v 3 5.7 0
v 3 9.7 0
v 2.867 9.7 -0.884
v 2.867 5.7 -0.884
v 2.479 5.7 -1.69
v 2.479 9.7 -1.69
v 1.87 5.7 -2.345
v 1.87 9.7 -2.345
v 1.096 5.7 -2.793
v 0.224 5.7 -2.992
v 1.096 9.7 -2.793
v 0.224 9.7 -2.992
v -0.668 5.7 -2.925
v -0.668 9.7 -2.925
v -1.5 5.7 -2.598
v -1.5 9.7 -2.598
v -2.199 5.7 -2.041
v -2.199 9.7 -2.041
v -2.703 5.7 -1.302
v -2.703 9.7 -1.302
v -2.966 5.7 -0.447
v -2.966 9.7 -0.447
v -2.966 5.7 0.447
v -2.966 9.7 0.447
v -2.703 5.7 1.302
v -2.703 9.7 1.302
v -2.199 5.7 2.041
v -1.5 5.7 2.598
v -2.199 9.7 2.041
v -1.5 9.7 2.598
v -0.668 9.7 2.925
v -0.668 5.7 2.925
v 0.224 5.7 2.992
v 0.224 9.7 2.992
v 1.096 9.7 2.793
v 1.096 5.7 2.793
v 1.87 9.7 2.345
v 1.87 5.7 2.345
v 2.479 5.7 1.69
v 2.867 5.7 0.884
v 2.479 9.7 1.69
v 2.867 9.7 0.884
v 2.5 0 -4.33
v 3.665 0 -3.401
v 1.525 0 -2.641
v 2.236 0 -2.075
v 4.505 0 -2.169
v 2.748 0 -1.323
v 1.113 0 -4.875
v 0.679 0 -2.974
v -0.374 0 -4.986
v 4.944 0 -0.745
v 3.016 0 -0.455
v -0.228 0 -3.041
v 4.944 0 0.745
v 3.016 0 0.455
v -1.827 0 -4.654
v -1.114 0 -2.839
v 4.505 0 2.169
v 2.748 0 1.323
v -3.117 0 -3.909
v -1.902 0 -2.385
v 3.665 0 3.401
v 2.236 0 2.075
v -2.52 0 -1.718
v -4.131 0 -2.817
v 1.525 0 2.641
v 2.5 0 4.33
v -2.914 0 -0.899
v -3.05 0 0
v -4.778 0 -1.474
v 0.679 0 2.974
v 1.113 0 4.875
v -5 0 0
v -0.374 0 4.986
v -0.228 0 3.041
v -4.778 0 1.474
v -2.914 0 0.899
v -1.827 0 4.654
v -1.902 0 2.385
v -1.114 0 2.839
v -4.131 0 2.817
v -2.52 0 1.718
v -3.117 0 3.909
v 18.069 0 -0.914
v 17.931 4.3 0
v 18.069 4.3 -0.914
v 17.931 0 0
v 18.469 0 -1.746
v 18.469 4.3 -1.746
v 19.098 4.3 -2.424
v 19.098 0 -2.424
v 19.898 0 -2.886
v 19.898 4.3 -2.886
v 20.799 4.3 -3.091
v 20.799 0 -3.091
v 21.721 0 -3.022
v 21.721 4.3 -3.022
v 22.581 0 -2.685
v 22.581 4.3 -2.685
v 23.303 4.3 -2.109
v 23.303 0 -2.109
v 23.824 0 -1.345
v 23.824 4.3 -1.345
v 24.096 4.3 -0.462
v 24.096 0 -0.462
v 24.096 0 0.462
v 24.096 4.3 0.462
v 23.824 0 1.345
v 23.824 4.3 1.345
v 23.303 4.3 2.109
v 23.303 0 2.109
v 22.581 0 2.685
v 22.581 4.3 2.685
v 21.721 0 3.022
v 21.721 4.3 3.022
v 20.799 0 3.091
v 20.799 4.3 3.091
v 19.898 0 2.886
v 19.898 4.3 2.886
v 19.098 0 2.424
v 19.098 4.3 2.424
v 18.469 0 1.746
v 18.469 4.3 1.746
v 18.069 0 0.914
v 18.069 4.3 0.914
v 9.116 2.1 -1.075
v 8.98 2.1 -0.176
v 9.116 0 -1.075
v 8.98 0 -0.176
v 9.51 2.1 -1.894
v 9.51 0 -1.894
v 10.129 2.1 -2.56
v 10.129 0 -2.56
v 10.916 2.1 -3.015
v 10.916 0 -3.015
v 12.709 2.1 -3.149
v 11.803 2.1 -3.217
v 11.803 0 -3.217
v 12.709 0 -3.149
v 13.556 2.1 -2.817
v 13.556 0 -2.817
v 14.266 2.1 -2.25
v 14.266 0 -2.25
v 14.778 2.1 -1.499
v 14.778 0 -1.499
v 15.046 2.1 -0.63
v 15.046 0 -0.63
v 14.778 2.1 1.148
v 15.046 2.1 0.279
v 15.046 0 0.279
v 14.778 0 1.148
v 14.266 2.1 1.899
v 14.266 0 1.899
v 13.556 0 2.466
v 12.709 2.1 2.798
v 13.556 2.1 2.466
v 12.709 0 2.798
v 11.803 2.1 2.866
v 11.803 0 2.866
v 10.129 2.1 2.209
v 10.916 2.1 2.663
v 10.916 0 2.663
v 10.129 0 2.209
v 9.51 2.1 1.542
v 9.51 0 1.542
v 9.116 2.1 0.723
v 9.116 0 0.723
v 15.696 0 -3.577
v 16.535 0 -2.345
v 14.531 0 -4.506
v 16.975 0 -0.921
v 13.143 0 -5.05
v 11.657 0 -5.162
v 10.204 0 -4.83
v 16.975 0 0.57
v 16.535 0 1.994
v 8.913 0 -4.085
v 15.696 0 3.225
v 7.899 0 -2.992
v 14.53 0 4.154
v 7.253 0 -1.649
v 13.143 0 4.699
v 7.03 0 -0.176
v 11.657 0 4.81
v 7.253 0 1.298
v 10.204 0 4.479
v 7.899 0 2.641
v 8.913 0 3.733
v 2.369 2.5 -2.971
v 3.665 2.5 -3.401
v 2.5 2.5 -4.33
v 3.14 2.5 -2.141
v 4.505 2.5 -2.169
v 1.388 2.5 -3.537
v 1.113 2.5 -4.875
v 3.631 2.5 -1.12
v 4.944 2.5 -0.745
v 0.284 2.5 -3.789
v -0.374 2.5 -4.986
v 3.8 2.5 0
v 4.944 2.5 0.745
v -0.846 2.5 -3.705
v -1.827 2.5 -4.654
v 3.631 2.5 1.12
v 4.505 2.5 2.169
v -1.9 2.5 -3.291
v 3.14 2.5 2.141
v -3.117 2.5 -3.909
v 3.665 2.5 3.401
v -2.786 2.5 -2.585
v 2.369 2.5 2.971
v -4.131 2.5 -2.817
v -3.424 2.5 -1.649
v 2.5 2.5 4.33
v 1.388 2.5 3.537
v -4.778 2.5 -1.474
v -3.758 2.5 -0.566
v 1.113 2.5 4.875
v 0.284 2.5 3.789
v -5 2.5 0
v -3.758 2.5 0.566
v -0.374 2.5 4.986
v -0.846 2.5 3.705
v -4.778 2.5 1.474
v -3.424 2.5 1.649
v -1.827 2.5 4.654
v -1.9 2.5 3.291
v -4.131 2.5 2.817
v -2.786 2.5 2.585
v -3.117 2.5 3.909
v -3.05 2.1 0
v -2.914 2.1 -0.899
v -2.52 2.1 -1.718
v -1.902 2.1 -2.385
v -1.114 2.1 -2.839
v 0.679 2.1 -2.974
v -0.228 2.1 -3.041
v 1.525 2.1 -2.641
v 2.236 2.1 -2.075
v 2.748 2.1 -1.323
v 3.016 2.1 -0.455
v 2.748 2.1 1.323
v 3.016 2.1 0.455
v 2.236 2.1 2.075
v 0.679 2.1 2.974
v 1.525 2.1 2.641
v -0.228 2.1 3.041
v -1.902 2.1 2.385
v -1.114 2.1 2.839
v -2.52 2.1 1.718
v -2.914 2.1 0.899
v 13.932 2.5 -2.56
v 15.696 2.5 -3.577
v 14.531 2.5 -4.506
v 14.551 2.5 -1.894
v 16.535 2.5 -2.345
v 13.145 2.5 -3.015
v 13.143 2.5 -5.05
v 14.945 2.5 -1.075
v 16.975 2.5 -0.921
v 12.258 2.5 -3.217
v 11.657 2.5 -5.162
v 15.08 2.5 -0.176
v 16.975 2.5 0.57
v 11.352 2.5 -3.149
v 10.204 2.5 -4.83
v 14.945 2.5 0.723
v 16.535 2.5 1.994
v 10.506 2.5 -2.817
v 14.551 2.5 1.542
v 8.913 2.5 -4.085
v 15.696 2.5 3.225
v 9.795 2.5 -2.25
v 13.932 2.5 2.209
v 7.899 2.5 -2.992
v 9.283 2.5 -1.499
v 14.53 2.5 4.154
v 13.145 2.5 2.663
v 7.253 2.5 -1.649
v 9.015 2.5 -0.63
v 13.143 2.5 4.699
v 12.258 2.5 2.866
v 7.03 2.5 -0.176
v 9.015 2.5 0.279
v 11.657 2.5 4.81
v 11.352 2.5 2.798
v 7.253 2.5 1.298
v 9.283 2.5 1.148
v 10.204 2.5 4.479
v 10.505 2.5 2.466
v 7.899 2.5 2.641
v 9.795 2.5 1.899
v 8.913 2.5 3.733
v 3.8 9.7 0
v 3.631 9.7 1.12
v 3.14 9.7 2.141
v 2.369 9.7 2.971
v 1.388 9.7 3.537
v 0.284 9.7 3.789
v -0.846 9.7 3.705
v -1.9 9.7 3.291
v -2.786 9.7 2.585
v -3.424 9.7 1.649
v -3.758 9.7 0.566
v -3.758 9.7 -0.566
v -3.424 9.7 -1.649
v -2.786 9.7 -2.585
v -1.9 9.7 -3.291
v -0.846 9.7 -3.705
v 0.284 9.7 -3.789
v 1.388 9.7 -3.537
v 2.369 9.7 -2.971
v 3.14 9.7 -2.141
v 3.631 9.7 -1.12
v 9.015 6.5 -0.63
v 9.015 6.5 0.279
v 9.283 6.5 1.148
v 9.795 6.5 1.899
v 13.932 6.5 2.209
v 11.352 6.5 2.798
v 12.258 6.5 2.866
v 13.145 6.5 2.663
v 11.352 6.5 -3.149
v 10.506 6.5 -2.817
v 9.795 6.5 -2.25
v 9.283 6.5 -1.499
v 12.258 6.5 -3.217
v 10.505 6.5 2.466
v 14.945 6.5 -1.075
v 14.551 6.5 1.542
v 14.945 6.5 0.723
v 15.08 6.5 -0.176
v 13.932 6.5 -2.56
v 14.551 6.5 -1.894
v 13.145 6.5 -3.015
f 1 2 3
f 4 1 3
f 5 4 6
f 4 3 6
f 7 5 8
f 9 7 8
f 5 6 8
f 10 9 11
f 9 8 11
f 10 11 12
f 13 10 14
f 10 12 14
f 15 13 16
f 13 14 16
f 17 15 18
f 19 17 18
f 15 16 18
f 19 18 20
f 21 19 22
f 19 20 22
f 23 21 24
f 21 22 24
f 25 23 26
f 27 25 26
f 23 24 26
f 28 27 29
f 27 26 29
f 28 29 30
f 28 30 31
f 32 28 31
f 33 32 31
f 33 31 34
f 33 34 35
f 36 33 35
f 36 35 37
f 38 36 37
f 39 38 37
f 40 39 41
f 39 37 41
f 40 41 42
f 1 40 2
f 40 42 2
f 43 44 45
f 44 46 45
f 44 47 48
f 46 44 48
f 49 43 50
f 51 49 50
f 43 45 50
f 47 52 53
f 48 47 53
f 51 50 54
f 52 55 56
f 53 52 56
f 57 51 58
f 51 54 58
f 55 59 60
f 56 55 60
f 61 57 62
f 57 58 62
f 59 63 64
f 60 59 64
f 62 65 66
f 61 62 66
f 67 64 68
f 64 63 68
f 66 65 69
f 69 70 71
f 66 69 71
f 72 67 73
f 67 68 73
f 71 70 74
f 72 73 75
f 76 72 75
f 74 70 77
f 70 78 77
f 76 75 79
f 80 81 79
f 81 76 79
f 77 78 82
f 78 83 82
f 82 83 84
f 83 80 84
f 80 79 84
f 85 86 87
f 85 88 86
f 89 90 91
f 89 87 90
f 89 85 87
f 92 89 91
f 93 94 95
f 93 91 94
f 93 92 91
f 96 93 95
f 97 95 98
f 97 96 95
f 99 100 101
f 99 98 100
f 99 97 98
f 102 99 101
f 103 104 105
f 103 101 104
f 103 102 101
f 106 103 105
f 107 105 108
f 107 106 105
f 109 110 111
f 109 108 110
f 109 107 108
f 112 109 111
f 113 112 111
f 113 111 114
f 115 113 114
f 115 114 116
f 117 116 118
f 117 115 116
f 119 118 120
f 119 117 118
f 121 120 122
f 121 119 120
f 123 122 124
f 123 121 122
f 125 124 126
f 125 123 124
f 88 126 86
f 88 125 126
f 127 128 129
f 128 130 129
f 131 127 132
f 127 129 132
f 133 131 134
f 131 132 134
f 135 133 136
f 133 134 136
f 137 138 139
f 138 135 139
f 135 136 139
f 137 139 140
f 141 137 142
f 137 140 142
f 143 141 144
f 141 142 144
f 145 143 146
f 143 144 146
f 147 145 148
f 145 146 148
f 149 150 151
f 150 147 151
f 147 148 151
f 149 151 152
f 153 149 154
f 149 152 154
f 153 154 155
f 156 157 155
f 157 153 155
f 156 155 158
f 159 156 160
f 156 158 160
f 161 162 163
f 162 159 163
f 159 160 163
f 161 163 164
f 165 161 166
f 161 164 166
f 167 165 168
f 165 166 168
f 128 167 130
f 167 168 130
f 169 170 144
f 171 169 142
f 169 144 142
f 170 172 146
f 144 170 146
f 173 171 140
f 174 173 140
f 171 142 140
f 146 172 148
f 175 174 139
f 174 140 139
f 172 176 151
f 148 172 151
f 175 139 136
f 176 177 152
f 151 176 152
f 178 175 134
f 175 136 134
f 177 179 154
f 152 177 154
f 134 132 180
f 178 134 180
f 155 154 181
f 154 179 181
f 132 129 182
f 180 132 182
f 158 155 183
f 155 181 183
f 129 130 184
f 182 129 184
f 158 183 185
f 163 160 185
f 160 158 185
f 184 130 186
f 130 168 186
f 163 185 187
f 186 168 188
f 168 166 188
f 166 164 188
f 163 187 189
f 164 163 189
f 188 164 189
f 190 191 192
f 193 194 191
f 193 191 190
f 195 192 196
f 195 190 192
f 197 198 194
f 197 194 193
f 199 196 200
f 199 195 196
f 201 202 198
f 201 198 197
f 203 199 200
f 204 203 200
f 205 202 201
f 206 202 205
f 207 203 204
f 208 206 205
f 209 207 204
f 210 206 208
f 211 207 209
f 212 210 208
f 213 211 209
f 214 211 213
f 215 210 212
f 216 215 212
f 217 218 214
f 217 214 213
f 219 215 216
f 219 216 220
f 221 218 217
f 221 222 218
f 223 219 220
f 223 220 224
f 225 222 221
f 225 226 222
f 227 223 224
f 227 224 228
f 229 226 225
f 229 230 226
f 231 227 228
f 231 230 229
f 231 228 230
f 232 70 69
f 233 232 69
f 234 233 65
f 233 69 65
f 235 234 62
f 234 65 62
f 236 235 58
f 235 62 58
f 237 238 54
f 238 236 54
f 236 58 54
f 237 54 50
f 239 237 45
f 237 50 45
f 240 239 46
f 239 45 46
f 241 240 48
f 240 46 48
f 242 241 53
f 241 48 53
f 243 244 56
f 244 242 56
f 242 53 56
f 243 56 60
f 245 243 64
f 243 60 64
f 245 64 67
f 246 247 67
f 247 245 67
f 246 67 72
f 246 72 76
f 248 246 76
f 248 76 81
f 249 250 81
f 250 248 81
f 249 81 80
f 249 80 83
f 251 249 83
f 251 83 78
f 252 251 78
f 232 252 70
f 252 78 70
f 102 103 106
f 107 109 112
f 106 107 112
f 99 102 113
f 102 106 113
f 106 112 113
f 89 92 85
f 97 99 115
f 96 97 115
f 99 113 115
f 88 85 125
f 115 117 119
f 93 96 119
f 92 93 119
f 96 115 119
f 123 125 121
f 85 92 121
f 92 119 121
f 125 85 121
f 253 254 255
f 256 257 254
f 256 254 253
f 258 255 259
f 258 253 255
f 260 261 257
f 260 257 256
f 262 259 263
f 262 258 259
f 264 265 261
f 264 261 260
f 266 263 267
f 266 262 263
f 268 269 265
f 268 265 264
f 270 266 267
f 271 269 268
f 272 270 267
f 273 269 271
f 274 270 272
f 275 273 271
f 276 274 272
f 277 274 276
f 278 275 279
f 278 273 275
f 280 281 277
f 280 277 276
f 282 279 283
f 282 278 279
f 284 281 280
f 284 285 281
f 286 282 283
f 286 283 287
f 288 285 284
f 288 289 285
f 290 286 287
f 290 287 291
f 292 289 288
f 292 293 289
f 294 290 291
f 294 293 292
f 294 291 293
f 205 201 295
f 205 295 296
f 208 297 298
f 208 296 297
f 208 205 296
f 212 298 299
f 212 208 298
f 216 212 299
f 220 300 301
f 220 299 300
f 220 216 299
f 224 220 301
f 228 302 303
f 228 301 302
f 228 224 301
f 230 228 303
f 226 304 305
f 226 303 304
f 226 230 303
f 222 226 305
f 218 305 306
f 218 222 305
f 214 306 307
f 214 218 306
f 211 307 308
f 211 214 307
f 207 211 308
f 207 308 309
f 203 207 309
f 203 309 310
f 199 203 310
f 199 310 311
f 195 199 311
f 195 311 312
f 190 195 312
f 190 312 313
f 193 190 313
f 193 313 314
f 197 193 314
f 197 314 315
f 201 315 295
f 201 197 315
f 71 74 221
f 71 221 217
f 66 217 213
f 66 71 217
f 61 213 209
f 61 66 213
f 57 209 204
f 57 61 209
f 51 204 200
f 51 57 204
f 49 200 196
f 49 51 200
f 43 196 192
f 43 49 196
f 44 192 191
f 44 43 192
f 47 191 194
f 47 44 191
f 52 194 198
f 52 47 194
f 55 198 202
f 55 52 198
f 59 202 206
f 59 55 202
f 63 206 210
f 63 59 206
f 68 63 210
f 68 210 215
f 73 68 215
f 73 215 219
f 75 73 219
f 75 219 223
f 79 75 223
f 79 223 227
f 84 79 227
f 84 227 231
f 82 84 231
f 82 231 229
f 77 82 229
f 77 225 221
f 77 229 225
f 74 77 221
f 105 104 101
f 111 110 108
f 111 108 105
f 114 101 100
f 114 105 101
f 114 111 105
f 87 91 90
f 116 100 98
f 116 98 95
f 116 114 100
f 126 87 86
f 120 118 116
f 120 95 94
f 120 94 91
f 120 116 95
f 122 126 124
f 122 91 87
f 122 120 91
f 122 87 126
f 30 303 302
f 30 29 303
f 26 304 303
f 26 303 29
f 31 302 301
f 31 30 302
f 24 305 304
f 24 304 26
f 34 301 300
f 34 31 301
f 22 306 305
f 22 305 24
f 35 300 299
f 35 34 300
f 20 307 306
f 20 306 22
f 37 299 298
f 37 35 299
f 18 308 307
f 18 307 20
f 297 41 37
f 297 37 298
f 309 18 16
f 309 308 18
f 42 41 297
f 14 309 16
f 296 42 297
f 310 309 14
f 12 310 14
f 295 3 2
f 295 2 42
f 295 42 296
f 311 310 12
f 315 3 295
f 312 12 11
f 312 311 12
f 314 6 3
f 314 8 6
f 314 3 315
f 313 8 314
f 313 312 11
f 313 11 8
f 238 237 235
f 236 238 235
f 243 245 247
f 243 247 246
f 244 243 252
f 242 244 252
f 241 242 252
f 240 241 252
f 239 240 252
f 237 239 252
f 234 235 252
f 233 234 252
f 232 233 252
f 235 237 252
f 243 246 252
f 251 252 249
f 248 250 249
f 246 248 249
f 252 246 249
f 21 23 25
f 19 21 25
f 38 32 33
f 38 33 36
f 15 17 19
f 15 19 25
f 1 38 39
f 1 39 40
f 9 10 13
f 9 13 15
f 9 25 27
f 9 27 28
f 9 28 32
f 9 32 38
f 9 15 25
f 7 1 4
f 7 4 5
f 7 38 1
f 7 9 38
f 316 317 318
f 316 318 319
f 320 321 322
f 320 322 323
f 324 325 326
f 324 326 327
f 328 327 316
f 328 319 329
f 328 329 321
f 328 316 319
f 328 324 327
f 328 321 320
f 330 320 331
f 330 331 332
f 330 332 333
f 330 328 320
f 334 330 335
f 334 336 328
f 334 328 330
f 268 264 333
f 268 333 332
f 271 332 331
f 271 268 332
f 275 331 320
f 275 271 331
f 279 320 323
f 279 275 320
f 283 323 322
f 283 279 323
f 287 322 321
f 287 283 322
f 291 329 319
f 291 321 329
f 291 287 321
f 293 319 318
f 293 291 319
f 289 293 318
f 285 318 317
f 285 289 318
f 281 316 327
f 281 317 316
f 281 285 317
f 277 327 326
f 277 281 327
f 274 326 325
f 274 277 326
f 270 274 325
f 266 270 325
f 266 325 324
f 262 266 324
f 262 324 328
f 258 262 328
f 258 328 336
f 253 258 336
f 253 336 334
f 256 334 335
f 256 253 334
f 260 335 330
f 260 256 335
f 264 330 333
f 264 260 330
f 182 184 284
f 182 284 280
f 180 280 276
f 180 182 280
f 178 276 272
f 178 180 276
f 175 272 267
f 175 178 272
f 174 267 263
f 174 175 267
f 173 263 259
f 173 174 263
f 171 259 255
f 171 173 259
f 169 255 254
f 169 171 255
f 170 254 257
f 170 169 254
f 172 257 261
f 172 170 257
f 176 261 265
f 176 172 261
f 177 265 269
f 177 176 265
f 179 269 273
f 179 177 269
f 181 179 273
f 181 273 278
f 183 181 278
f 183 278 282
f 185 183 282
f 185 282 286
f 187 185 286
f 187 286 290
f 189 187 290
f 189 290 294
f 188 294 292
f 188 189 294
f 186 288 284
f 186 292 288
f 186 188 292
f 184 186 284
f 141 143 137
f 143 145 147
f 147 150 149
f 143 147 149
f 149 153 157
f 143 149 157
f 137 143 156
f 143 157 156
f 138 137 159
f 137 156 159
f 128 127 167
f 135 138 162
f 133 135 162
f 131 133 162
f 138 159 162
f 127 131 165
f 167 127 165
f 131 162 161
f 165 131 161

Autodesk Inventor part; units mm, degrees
ref_plane "YZ Plane" through (0, 0, 0) normal (1, 0, 0) x (0, 1, 0)
ref_plane "XZ Plane" through (0, 0, 0) normal (0, 1, 0) x (-1, 0, 0)
ref_plane "XY Plane" through (0, 0, 0) normal (0, 0, 1) x (1, 0, 0)
sketch "Sketch4" plane through (0, 0, 0) normal (0, 1, 0) x (-1, 0, 0)
  circle A0 centre (0, 0) radius 3.05
  circle A1 centre (0, 0) radius 5
  circle A2 centre (-12.0305, -0.1757) radius 3.05
  circle A3 centre (-12.0305, -0.1757) radius 5
  circle A4 centre (-21.0308, 0) radius 3.1
  dimension "d13" = 6.1
  dimension "d14" = 10
  dimension "d25" = 6.1
  dimension "d26" = 10
  dimension "d30" = 6.2
extrude "Extrusion5" add sketch "Sketch4" along normal blind 2.5 contours A0 | A1 | A2 | A3
extrude "Extrusion6" cut sketch "Sketch4" along normal blind 2.1 contours A0 | A2
sketch "Sketch5" plane through (0, 2.5, 0) normal (0, 1, 0) x (1, 0, 0)
  circle A0 centre (0, 0) radius 3.8
  dimension "d19" = 7.6
extrude "Extrusion7" add sketch "Sketch5" along normal blind 7.2
sketch "Sketch6" plane through (0, 9.7, 0) normal (0, 1, 0) x (1, 0, 0)
  circle A0 centre (0, 0) radius 3
  dimension "d22" = 6
extrude "Extrusion8" cut sketch "Sketch6" against normal blind 4
sketch "Sketch7" plane through (12.0305, 2.5, -0.1757) normal (0, 1, 0) x (1, 0, 0)
  circle A0 centre (0, 0) radius 3.05
  circle A1 centre (0, 0) radius 5 projected
  point P0 (-12.0305, -0.1757)
  dimension "d27" = 6.1
extrude "Extrusion9" add sketch "Sketch7" along normal blind 4 contours A0
extrude "Extrusion10" add sketch "Sketch4" along normal blind 4.3 contours A4
sketch "Sketch8" plane through (0, 0, 0) normal (0, 1, 0) x (-1, 0, 0)
  circle A0 centre (0, 0) radius 3.05 projected
  circle A1 centre (0, 0) radius 5 projected
  circle A2 centre (-12.0305, -0.1757) radius 5 projected
split body "Split1" sketch "Sketch8" result two bodies curves A1 first body at (3.2893, 7.3, 0.2655)
split body "Split2" sketch "Sketch8" result two bodies bodies 3 curves A2 first body at (7.5887, 1.6667, -0.8976)
equation "\"d19\" = Shaft_Diameter - Shaft_Fit_Loose"
equation "\"Shaft_Diameter\" = 8"
equation "\"Shaft_Fit_Loose\" = 0.4"
equation "\"Shaft_Width\" = 7"
equation "\"Distance_Between\" = 3"
properties part number "Multiboard Thread insert"
